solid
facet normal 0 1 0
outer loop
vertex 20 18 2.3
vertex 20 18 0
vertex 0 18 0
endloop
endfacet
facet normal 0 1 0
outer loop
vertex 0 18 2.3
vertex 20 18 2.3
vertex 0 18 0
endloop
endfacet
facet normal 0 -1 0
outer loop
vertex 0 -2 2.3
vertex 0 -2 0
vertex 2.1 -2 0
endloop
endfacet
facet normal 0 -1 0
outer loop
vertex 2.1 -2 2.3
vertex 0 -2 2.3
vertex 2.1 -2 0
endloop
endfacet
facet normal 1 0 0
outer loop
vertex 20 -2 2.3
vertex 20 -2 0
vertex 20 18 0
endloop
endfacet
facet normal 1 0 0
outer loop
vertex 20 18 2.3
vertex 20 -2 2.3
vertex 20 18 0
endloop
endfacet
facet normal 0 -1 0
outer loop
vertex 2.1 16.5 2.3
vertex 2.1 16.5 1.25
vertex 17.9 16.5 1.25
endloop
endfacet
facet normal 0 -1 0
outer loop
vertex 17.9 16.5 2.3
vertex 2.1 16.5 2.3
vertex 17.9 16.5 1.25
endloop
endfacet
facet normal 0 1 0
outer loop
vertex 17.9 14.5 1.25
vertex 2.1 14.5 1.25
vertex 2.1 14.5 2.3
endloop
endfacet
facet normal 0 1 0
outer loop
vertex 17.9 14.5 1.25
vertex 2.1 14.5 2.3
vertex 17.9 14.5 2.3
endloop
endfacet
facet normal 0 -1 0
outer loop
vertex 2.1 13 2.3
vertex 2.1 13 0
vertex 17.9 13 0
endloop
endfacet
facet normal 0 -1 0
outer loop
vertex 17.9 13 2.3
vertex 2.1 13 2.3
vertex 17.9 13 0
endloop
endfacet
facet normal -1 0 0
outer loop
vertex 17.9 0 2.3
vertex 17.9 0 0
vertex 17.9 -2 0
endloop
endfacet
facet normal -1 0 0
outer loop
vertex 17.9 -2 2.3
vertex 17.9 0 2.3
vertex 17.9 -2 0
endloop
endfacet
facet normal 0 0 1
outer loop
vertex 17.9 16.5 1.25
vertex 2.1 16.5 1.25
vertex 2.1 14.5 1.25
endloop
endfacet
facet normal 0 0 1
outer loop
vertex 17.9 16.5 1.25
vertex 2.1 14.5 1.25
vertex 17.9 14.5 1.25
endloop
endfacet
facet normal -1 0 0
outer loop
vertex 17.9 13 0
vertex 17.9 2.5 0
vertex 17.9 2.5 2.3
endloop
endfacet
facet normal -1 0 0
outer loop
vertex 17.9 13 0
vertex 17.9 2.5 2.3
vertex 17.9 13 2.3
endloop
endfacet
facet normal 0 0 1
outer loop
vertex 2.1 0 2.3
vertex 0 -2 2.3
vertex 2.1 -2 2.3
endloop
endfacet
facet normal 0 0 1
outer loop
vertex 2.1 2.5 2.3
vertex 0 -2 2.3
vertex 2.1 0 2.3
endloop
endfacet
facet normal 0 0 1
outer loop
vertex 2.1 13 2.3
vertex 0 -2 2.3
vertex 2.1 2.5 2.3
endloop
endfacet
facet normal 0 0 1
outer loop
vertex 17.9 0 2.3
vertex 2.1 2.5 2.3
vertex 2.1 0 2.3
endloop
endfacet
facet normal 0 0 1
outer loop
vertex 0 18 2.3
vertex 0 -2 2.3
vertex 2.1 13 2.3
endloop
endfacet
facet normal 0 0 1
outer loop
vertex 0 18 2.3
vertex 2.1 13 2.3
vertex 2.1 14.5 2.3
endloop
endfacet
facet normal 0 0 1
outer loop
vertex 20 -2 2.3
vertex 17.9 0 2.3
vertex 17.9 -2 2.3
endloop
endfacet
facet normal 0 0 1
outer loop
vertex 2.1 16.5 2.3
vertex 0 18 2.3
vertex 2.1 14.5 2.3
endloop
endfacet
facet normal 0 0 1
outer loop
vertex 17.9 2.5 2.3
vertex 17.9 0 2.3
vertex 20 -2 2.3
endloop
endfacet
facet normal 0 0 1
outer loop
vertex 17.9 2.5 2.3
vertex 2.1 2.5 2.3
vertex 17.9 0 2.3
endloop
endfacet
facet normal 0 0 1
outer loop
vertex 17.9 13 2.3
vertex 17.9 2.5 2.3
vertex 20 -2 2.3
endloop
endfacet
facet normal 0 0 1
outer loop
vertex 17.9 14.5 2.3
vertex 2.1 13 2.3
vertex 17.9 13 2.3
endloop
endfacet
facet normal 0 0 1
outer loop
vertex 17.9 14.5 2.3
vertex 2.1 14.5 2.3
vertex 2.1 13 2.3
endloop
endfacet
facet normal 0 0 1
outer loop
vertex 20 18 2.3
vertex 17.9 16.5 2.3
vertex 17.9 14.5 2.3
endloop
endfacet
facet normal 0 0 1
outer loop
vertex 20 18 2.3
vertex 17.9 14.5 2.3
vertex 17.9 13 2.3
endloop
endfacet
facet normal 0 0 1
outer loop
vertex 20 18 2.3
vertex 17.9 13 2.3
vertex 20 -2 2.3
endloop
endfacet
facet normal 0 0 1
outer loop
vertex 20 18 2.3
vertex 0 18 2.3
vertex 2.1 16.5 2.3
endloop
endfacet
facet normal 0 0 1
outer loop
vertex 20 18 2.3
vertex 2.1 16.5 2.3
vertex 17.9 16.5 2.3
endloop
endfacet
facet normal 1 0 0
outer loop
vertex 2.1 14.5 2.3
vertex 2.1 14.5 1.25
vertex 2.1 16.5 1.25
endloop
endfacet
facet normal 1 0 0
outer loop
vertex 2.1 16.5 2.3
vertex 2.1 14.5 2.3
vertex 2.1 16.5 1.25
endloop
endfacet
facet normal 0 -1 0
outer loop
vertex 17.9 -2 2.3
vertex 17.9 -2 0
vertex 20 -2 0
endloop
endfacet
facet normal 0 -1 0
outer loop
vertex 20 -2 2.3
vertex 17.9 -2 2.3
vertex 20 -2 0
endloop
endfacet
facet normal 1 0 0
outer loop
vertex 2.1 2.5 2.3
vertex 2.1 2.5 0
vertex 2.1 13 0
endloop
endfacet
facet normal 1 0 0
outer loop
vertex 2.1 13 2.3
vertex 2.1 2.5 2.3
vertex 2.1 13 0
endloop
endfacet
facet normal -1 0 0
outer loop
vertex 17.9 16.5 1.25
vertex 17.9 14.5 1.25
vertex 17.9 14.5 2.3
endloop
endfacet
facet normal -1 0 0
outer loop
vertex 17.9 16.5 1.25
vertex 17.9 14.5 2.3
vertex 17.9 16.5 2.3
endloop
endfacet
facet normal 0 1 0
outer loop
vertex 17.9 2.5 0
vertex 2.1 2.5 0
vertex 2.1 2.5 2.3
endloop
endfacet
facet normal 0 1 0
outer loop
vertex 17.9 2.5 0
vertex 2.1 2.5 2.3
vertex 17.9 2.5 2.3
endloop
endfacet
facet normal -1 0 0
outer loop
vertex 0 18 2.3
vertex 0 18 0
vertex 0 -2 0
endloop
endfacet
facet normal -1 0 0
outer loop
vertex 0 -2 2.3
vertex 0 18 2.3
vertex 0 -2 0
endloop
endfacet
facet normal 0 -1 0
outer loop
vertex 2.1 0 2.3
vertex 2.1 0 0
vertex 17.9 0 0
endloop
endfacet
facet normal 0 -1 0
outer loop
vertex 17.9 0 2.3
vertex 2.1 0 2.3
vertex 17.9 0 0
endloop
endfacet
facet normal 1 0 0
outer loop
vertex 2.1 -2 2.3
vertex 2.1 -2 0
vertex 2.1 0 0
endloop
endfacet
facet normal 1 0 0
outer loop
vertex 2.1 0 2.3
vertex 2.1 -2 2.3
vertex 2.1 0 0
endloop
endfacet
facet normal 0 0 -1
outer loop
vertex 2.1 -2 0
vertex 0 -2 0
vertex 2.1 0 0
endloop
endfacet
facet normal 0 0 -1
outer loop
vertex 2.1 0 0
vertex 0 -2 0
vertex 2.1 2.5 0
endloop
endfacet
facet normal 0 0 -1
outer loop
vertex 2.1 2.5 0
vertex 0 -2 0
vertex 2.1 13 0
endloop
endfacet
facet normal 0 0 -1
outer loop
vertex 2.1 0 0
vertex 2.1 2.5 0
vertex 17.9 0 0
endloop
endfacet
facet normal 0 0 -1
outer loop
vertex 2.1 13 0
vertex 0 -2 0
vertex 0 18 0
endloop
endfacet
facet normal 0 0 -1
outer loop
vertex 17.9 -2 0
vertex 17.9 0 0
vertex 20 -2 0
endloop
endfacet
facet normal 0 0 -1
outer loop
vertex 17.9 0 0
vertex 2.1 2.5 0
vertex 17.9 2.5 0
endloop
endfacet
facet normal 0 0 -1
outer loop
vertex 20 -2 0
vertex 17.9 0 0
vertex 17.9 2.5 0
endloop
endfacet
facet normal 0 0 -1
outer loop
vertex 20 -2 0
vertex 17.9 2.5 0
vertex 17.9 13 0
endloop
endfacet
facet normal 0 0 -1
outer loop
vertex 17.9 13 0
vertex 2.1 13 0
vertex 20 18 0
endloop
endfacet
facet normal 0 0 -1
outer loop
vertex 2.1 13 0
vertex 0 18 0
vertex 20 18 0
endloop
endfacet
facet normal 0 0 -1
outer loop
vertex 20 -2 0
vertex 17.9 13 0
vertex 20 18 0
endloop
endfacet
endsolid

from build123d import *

# Parameters (mm, degrees)
SKETCH1_W           = 15.8
SKETCH1_H           = 10.5
SKETCH1_H_2         = 2
BOSS_EXTRUDE1_DEPTH = 2.3
SKETCH1_2_W         = 15.8
SKETCH1_2_H         = 2
BOSS_EXTRUDE2_DEPTH = 1.25


with BuildPart() as part:
    # Sketch1 → Boss-Extrude1 (new body)
    with BuildSketch(Plane.XY):
        Polygon((0, 0), (0, -2), (2.1, -2), (2.1, 0), (17.9, 0), (17.9, -2), (20, -2), (20, 0), (20, 18), (0, 18), align=None)
        with Locations((10, 7.75)):
            Rectangle(SKETCH1_W, SKETCH1_H, mode=Mode.SUBTRACT)
        with Locations((10, 15.5)):
            Rectangle(SKETCH1_W, SKETCH1_H_2, mode=Mode.SUBTRACT)
    extrude(amount=BOSS_EXTRUDE1_DEPTH)

    # Sketch1<2> → Boss-Extrude2 (add)
    with BuildSketch(Plane.XY):
        with Locations((10, 15.5)):
            Rectangle(SKETCH1_2_W, SKETCH1_2_H)
    extrude(amount=BOSS_EXTRUDE2_DEPTH)


solid = part.part
